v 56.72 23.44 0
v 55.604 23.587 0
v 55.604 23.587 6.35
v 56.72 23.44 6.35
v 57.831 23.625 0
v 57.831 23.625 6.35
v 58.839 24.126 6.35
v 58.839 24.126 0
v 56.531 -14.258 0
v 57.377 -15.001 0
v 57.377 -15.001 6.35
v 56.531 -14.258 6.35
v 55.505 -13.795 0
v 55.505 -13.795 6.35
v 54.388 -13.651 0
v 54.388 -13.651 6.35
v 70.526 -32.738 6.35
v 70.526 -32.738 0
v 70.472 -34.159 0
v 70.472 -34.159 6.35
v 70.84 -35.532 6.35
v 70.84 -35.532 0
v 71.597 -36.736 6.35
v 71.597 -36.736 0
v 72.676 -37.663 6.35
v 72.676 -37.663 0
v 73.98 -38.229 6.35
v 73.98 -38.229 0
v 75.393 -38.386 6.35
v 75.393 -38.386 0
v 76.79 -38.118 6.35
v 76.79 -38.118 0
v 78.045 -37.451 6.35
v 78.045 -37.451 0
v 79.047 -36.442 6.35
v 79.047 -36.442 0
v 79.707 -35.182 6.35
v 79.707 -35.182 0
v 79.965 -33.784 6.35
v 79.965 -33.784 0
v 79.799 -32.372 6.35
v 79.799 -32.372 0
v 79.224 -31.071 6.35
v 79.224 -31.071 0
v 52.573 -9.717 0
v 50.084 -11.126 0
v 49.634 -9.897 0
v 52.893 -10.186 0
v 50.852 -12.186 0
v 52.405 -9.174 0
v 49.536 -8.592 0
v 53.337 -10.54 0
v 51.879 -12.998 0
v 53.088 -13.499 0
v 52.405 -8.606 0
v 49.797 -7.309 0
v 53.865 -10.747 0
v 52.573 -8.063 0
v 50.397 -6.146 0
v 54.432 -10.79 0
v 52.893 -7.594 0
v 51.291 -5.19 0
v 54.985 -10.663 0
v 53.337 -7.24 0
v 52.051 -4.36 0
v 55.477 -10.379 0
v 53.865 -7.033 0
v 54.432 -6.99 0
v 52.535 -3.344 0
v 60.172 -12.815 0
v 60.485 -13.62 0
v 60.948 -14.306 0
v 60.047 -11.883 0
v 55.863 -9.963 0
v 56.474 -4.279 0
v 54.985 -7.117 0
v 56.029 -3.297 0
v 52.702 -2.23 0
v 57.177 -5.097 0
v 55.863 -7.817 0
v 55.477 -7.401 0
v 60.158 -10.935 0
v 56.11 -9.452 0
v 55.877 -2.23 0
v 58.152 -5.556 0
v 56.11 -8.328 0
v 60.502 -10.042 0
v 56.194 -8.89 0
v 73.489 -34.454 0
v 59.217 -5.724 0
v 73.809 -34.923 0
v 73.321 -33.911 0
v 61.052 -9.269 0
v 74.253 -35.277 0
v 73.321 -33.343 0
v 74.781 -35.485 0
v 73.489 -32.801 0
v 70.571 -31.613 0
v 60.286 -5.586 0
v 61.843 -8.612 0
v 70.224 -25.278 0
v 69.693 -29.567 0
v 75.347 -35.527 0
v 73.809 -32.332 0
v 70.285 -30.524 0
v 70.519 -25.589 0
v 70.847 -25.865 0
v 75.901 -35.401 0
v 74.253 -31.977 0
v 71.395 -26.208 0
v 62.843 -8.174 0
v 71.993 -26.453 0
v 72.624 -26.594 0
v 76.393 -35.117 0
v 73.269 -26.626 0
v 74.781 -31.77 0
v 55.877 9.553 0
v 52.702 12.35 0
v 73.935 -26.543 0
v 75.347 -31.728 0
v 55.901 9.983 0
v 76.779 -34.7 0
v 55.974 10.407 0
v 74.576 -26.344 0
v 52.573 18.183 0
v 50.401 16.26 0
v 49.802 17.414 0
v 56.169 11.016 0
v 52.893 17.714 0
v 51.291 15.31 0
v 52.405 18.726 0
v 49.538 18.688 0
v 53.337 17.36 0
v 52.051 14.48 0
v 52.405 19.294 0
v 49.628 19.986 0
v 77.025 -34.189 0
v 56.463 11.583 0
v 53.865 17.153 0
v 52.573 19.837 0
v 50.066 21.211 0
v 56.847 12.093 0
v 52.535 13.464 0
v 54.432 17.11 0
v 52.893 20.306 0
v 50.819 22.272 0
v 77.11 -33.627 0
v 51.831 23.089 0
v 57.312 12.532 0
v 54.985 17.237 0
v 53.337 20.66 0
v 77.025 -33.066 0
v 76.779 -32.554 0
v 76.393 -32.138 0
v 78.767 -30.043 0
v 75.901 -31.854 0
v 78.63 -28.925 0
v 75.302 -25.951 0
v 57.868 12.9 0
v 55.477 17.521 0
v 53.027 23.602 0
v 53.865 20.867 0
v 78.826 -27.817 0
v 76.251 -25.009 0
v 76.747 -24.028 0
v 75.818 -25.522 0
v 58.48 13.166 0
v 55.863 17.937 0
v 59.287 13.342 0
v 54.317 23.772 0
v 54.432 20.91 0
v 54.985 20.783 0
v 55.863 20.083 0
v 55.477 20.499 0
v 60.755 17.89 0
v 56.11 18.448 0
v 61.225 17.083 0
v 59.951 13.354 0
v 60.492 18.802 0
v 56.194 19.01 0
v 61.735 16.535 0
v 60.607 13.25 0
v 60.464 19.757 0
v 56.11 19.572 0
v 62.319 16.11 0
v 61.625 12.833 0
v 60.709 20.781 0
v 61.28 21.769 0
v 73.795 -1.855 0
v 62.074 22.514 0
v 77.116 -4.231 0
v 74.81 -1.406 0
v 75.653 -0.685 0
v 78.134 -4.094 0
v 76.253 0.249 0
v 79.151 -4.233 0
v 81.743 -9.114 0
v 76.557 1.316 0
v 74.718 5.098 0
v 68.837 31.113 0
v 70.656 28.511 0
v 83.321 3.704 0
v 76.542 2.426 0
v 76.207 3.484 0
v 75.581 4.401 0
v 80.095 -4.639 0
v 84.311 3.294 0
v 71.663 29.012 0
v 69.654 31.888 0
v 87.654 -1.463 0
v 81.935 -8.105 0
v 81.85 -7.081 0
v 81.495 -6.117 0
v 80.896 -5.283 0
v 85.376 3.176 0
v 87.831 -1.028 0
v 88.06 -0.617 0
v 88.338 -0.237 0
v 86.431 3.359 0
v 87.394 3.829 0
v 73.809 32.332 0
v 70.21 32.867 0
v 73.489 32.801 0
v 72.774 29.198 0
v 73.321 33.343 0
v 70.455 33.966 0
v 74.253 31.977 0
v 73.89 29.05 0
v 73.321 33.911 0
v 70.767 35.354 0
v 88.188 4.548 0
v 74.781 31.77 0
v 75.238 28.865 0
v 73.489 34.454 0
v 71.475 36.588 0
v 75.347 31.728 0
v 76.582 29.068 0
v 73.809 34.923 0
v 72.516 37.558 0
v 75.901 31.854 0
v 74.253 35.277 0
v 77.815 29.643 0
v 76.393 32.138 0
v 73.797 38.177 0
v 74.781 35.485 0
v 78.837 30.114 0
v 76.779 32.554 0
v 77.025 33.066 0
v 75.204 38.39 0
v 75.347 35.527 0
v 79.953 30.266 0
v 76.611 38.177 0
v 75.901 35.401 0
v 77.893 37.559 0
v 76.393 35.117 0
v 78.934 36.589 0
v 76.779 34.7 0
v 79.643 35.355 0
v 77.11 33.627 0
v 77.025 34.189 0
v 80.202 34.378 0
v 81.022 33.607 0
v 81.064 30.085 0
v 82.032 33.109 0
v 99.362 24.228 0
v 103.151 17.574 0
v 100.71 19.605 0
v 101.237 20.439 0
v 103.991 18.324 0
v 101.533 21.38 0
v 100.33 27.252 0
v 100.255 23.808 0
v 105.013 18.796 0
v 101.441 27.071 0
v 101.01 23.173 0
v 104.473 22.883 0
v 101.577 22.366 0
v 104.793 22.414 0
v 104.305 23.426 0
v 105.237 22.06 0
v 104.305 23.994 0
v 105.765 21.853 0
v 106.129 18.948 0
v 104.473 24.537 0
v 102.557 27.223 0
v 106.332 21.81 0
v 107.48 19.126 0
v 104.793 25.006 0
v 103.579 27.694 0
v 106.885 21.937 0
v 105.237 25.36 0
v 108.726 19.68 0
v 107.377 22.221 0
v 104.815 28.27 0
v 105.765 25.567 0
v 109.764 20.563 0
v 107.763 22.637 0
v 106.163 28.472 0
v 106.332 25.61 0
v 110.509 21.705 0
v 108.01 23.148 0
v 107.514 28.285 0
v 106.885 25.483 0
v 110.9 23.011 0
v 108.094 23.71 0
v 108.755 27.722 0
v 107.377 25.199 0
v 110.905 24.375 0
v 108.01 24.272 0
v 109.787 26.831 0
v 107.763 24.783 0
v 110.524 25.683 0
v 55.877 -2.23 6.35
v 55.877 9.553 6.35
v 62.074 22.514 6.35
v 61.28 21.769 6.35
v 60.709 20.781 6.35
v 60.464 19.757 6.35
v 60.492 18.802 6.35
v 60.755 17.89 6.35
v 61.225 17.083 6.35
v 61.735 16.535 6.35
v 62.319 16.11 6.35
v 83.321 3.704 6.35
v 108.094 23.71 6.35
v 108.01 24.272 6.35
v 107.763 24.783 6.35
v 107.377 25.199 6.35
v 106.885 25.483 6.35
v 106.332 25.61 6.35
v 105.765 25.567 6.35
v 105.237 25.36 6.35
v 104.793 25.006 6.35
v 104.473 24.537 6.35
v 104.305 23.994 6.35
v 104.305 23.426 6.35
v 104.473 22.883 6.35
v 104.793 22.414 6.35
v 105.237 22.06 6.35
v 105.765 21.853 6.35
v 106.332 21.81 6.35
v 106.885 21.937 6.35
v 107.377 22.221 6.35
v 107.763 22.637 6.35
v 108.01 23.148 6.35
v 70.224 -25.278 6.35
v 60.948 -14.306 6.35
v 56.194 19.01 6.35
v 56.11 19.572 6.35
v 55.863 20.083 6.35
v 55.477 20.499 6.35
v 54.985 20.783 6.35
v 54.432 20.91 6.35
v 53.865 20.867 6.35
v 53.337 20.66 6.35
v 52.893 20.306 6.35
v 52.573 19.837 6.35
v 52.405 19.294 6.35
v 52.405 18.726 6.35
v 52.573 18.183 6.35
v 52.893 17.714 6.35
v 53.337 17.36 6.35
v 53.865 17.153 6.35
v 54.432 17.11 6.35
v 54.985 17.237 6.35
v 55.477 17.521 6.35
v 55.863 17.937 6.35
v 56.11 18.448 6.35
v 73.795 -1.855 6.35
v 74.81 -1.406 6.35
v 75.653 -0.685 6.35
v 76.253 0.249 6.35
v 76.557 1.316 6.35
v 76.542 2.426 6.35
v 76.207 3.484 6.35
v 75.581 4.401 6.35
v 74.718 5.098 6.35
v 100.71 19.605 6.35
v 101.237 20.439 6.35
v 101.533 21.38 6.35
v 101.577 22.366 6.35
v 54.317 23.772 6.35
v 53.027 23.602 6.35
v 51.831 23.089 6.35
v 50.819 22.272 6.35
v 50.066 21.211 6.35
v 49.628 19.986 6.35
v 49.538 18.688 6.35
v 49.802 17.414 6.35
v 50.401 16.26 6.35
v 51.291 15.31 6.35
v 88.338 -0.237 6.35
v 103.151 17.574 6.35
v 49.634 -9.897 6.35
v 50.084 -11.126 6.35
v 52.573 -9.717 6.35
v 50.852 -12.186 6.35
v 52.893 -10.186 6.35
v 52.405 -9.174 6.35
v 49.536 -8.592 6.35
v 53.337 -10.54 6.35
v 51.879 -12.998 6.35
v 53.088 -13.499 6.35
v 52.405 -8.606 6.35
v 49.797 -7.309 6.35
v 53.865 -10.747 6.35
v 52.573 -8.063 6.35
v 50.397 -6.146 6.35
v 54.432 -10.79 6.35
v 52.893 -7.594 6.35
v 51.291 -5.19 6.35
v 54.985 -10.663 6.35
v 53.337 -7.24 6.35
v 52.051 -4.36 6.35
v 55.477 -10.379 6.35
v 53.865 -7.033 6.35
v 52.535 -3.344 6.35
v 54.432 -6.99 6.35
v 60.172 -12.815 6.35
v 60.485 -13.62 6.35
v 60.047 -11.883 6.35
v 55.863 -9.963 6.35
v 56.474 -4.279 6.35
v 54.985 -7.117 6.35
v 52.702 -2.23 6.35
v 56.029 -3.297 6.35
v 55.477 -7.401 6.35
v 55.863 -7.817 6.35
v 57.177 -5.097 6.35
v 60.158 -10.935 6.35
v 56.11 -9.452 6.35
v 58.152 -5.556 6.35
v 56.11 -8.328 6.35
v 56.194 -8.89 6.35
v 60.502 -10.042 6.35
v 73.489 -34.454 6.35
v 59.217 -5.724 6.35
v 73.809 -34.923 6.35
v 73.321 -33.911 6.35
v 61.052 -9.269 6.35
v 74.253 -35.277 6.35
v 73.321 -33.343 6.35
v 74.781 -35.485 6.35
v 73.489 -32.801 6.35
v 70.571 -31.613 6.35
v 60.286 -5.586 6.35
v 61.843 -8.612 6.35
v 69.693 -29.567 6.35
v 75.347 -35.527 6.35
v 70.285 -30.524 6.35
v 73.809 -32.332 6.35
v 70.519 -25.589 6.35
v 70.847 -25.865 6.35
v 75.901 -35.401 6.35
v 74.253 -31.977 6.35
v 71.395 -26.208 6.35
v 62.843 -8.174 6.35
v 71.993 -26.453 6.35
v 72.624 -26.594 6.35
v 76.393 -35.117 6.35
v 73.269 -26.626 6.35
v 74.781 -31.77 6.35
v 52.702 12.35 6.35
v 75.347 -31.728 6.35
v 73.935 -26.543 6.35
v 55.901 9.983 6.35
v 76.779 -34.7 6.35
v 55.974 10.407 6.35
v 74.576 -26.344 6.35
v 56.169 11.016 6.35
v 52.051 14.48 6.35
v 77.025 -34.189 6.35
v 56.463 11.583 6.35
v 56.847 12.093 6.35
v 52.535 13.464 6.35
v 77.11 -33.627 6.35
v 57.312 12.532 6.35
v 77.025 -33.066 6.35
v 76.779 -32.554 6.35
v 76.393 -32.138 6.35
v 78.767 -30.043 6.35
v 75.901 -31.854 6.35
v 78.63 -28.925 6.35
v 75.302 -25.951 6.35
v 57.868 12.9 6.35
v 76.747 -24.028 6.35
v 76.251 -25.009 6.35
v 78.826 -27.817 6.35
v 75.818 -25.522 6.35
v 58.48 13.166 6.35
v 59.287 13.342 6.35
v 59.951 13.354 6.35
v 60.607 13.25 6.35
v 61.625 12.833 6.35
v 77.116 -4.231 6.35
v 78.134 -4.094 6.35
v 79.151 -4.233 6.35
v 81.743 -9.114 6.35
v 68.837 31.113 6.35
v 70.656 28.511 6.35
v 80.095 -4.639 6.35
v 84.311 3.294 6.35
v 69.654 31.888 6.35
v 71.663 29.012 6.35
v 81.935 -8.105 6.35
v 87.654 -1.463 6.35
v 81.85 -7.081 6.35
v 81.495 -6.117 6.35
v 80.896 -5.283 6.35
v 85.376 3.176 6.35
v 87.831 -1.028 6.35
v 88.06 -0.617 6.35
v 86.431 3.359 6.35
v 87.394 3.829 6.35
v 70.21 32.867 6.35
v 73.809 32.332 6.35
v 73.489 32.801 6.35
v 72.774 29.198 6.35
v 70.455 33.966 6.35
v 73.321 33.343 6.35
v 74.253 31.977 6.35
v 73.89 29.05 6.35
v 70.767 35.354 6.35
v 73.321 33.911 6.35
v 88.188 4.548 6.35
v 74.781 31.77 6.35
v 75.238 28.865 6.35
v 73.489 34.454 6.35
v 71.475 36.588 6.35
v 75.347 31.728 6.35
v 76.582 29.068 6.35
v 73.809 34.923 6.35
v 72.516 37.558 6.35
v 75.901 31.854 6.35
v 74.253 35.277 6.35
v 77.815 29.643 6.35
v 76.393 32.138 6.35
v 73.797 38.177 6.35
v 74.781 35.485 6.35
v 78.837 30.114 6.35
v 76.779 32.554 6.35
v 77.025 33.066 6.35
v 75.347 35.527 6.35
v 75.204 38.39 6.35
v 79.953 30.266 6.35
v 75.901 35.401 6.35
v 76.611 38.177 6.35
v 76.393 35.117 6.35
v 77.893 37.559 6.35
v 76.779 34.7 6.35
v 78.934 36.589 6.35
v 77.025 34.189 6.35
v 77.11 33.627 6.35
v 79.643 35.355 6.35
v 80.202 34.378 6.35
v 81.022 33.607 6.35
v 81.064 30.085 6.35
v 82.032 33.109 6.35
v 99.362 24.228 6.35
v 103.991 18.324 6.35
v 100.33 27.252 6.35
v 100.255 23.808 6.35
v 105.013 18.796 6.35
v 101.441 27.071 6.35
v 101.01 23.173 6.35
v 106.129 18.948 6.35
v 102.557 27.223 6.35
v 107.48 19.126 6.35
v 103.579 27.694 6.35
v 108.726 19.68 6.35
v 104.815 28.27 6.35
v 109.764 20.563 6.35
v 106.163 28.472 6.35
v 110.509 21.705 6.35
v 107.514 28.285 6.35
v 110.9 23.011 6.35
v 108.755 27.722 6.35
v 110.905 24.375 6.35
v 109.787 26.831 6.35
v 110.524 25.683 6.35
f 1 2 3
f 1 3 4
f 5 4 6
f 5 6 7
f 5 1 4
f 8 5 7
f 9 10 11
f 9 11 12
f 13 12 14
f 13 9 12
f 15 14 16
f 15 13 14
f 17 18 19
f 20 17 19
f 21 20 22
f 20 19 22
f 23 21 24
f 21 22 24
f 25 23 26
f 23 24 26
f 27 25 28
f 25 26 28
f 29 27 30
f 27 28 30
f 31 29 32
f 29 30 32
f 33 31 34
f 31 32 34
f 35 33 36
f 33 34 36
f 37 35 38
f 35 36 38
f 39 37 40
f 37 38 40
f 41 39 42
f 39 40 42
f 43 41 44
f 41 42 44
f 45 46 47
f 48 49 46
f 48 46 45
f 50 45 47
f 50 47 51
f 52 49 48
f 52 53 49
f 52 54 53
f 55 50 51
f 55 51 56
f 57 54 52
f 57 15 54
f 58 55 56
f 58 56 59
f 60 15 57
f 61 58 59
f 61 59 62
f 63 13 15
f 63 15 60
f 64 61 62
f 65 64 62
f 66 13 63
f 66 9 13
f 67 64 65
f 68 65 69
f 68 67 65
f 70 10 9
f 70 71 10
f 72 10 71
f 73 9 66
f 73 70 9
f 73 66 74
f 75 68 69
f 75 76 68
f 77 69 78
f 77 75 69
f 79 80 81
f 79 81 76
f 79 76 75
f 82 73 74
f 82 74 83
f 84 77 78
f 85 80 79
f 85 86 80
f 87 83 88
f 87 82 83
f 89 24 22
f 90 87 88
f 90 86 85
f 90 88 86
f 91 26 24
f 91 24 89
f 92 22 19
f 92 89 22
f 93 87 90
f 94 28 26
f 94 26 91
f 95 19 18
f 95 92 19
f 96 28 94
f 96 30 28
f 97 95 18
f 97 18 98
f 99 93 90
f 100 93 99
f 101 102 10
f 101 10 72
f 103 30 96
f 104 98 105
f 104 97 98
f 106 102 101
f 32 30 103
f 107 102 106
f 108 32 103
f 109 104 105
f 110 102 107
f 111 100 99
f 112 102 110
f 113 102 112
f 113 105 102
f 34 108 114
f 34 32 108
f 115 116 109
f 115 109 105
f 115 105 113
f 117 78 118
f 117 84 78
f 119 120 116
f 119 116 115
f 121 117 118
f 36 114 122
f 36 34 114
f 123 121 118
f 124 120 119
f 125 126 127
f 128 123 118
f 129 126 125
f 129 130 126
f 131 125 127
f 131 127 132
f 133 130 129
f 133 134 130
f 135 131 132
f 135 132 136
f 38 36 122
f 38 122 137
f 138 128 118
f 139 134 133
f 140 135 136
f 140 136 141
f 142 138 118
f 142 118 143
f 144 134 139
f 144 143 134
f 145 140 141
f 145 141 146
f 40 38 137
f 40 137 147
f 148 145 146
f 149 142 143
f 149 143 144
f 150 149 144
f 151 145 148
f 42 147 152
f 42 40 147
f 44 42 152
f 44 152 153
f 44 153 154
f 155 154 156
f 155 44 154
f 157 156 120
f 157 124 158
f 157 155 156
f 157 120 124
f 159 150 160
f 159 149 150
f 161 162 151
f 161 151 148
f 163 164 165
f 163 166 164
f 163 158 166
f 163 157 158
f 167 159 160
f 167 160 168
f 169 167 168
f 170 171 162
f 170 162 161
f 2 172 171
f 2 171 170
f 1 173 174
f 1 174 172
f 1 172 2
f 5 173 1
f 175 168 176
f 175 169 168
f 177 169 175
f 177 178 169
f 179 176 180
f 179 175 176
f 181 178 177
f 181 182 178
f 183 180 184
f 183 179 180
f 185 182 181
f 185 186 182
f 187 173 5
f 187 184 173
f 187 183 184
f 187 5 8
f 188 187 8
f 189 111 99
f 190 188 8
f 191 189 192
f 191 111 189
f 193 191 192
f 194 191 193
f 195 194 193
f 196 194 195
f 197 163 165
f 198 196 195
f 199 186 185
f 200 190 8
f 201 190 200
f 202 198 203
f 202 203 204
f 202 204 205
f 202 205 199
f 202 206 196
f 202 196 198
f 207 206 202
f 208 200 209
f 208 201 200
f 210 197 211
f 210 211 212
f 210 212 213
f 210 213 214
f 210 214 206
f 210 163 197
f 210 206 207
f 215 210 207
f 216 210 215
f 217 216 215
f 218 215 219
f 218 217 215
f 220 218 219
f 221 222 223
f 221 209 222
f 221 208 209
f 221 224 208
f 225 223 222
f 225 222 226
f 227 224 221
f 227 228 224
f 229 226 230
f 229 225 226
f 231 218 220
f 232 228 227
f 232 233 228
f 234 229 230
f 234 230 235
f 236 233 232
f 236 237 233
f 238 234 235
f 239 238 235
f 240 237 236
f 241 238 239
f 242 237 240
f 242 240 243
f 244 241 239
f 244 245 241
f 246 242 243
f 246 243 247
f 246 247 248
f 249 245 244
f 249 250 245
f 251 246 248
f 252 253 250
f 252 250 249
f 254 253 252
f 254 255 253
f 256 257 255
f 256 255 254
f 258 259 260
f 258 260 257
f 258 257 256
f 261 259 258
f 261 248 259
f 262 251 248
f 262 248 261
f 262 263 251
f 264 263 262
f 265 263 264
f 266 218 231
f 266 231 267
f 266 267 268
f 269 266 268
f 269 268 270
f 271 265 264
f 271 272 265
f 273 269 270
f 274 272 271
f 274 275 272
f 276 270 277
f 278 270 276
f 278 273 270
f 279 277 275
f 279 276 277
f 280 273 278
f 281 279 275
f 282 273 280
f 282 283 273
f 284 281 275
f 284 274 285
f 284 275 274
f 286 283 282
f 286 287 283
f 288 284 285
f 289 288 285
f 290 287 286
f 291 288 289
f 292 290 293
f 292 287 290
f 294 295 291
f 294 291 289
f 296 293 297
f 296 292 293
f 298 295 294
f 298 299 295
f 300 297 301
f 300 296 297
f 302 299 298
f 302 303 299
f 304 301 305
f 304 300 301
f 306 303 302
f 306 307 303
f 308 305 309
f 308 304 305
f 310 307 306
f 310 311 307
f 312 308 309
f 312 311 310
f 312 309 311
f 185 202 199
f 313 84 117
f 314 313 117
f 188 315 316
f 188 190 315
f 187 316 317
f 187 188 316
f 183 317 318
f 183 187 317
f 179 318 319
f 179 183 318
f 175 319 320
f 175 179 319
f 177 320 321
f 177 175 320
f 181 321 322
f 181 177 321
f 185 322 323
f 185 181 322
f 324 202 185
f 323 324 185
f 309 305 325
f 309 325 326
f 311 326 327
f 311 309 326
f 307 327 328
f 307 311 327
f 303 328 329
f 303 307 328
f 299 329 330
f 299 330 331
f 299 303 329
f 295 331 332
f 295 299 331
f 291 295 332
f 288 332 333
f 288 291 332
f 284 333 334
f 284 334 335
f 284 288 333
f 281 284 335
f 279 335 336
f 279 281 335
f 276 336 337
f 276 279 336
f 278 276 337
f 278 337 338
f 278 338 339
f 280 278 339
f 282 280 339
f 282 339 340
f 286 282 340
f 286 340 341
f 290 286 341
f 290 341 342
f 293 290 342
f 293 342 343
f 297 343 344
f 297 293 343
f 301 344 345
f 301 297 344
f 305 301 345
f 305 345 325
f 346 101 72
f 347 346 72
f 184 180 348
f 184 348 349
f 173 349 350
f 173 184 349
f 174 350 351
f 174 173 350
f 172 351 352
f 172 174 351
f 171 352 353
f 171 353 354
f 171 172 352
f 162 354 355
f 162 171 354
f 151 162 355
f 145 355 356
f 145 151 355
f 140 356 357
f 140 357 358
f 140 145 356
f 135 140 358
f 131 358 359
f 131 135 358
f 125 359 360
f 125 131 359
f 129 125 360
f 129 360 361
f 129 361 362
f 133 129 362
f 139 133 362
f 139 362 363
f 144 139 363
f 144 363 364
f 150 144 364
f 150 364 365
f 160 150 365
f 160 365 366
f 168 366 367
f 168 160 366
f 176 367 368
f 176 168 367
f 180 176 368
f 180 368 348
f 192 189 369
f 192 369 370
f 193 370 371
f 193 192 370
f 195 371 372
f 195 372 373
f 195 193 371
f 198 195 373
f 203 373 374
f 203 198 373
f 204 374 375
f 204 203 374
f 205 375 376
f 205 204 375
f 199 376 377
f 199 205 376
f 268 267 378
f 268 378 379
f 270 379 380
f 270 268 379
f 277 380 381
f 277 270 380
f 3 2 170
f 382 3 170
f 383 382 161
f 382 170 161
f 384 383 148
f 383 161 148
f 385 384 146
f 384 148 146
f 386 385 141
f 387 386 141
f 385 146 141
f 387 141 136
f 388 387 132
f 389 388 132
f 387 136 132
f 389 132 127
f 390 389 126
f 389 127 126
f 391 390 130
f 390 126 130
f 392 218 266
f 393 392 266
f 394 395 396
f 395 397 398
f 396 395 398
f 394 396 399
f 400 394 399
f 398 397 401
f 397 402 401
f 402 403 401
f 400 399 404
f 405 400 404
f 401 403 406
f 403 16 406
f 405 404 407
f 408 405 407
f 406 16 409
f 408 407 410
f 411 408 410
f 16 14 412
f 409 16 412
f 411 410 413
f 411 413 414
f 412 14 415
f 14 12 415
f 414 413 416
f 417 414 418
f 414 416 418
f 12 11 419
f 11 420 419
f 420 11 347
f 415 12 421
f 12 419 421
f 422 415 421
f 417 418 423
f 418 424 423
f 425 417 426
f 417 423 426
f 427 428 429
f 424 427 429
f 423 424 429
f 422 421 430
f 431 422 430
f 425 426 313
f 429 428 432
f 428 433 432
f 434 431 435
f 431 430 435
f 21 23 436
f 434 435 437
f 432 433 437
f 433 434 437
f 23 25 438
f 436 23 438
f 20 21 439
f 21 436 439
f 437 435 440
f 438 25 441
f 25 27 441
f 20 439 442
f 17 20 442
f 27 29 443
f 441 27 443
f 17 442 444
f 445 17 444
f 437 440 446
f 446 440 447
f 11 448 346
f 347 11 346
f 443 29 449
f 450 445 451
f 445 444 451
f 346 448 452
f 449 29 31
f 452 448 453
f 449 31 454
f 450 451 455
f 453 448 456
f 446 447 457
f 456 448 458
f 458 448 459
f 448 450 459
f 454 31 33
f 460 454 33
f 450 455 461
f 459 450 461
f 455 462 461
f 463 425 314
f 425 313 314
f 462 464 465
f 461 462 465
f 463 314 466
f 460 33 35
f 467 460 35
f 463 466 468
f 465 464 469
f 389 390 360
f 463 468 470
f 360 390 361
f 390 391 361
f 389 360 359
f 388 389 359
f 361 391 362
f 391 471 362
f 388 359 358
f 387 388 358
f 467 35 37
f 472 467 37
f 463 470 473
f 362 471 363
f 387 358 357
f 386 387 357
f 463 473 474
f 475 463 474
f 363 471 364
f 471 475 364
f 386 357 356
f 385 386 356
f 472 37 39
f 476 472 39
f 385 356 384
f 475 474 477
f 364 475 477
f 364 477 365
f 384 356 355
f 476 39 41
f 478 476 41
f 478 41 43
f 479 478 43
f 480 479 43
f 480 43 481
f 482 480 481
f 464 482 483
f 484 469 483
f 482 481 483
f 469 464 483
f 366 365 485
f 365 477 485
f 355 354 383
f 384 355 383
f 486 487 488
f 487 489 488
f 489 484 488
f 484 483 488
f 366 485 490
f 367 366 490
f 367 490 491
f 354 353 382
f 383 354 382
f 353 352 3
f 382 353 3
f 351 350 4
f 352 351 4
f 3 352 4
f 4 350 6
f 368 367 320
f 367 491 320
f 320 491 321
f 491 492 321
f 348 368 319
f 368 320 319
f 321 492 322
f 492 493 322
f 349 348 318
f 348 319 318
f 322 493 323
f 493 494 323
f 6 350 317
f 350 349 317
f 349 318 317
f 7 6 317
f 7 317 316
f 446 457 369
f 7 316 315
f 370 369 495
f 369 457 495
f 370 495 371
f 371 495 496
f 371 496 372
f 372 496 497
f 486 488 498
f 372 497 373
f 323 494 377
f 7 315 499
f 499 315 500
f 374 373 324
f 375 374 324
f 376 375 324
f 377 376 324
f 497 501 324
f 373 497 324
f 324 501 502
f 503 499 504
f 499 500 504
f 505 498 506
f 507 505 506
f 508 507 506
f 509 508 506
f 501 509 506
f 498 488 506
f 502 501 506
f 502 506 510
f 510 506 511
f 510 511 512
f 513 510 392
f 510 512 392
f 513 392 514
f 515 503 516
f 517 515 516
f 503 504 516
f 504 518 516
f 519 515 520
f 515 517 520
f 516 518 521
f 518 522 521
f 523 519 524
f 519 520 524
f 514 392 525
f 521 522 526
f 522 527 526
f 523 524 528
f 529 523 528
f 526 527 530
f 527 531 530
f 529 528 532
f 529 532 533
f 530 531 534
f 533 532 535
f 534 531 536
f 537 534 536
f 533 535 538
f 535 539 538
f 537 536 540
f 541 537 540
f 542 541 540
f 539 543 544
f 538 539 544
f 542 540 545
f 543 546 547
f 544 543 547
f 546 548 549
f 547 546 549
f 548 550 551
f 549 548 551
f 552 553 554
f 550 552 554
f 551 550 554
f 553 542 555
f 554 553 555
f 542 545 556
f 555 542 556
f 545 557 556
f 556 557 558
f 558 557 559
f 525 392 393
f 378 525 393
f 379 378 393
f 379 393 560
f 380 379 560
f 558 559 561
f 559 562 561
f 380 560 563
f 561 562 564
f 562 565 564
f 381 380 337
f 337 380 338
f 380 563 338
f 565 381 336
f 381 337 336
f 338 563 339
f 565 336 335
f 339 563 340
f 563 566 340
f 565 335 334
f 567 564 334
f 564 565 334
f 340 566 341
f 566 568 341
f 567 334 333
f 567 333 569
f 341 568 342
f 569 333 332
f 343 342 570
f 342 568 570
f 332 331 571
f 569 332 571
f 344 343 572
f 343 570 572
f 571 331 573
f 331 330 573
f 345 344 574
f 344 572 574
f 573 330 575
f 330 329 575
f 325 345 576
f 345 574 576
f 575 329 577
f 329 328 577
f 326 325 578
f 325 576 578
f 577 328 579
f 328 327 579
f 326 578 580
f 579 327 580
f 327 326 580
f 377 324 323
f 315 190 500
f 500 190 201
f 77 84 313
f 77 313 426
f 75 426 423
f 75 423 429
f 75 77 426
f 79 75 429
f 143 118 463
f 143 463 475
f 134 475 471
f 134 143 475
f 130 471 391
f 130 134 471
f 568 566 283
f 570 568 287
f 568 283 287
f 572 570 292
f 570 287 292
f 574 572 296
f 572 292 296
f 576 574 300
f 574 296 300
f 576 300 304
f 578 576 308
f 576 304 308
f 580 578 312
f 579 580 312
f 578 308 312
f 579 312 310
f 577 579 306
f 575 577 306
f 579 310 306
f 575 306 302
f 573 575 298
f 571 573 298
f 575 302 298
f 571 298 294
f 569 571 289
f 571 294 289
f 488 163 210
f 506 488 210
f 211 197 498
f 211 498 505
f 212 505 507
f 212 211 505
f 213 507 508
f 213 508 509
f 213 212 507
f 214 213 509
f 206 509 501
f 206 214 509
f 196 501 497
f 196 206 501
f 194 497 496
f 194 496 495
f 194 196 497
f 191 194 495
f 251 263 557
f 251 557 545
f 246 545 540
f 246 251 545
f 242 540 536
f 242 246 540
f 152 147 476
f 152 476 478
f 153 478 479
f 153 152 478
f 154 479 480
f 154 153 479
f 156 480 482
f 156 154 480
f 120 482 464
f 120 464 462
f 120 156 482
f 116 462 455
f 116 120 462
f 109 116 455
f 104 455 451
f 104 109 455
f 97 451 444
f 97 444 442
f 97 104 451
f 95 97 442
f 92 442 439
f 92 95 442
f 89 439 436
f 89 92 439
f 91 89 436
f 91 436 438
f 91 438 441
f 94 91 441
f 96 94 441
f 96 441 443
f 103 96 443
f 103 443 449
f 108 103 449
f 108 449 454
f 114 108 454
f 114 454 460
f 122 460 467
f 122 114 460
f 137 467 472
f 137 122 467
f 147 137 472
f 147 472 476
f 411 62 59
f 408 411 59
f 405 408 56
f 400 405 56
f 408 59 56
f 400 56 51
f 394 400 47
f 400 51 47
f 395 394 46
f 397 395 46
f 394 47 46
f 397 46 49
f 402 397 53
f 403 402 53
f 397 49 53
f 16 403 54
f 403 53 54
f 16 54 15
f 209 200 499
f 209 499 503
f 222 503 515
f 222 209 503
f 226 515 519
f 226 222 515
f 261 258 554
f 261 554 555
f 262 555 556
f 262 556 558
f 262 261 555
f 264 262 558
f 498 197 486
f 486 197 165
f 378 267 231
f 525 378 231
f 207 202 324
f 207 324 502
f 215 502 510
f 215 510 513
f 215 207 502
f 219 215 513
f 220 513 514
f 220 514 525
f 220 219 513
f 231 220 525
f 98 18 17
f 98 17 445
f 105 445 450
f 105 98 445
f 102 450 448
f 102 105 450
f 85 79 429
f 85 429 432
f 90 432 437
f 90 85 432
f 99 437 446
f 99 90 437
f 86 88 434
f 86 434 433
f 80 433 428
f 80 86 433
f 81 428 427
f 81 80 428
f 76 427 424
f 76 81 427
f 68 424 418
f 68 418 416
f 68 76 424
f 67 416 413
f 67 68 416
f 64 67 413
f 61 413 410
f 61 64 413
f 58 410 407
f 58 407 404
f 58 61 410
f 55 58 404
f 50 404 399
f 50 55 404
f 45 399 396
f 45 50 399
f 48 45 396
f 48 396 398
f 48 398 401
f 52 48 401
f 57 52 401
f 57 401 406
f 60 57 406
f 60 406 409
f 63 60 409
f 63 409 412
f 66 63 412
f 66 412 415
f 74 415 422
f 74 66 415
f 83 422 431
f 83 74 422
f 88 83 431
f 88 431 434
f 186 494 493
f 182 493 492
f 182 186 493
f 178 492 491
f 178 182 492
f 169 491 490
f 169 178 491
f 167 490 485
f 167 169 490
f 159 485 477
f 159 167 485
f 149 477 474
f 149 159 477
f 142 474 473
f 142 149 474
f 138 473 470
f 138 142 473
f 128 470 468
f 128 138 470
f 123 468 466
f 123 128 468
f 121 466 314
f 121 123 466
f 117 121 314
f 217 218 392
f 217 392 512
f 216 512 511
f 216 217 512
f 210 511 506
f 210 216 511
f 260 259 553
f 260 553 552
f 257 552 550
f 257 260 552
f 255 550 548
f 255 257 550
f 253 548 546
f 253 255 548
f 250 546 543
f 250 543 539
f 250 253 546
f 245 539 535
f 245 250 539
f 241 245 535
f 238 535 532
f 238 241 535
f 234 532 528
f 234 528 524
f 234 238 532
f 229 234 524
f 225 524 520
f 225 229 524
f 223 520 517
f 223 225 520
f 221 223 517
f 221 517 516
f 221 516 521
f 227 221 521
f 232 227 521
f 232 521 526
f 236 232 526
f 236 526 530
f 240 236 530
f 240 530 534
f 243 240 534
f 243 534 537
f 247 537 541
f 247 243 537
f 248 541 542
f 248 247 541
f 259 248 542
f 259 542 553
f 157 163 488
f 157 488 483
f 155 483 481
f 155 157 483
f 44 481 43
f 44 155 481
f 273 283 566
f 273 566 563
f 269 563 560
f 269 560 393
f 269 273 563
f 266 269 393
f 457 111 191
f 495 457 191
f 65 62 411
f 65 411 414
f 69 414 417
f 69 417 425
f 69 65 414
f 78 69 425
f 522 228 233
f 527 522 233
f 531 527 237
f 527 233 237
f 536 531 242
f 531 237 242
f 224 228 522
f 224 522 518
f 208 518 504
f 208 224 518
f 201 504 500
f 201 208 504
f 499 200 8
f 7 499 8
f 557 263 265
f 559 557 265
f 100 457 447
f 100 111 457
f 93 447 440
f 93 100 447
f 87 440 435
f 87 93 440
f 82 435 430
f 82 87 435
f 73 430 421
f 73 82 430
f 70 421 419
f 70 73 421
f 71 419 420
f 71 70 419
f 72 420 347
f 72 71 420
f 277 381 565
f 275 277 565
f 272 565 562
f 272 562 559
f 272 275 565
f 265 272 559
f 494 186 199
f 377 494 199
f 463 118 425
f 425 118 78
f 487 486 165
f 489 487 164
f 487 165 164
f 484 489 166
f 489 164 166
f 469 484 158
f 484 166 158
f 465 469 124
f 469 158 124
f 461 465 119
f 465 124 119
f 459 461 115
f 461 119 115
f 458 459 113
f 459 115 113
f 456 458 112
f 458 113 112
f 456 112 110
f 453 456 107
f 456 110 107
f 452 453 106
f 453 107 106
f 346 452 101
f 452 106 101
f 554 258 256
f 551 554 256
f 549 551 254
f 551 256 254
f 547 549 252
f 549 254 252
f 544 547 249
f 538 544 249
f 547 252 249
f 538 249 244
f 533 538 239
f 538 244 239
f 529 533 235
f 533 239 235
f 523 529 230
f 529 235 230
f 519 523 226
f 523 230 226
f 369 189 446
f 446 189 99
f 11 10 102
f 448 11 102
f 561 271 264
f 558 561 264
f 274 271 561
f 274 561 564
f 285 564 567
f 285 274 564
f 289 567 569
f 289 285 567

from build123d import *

# Parameters (mm, degrees)
SKETCH1_R           = 4.7625
SKETCH1_R_2         = 1.905
BOSS_EXTRUDE1_DEPTH = 6.35
FILLET1_R           = 3.81
FILLET2_R           = 3.81


with BuildPart() as part:
    # Sketch1 → Boss-Extrude1 (new body)
    # profile 1 of 10: a face of its own
    with BuildSketch(Plane.XY):
        with Locations((106.189208713, 23.71)):
            Circle(SKETCH1_R)
        with Locations((106.189208713, 23.71)):
            Circle(SKETCH1_R_2, mode=Mode.SUBTRACT)
    # profile 2 of 10: a face of its own
    with BuildSketch(Plane.XY):
        with BuildLine():
            Line((87.880964772, -0.786362752), (104.53862394, 19.242676846))
            ThreePointArc((104.53862394, 19.242676846), (103.143914747, 20.048362263), (102.097532116, 21.272872823))
            Line((102.097532116, 21.272872823), (86.113888675, 2.054264483))
            Line((86.113888675, 2.054264483), (58.96261429, 18.093110387))
            ThreePointArc((58.96261429, 18.093110387), (58.389707875, 16.587746324), (57.347778506, 15.359444279))
            Line((57.347778506, 15.359444279), (82.443811077, 0.534674233))
            Line((82.443811077, 0.534674233), (58.194514032, -6.164197988))
            ThreePointArc((58.194514032, -6.164197988), (58.832358657, -7.4612961), (59.051708713, -8.89))
            ThreePointArc((59.051708713, -8.89), (59.048766191, -9.057388361), (59.039942261, -9.224569879))
            Line((59.039942261, -9.224569879), (84.017242402, -2.324586685))
            Line((84.017242402, -2.324586685), (75.126101157, -28.865420044))
            ThreePointArc((75.126101157, -28.865420044), (76.717900747, -29.111421646), (78.136663259, -29.873954045))
            Line((78.136663259, -29.873954045), (87.880964772, -0.786362752))
        make_face()
    # profile 3 of 10: a face of its own
    with BuildSketch(Plane.XY):
        with BuildLine():
            ThreePointArc((101.428860996, 23.566836206), (101.65338858, 25.161806453), (102.396731965, 26.590716294))
            Line((102.396731965, 26.590716294), (79.965447461, 33.770428593))
            ThreePointArc((79.965447461, 33.770428593), (79.967061643, 33.698854784), (79.967599745, 33.627264799))
            ThreePointArc((79.967599745, 33.627264799), (79.718583807, 32.107439852), (78.997576492, 30.746548504))
            Line((78.997576492, 30.746548504), (101.428860996, 23.566836206))
        make_face()
    # profile 4 of 10: a face of its own
    with BuildSketch(Plane.XY):
        with Locations((75.205099745, 33.627264799)):
            Circle(SKETCH1_R)
        with Locations((75.205099745, 33.627264799)):
            Circle(SKETCH1_R_2, mode=Mode.SUBTRACT)
    # profile 5 of 10: a face of its own
    with BuildSketch(Plane.XY):
        with BuildLine():
            ThreePointArc((72.434047253, 29.753936212), (71.301416872, 30.89913975), (70.615297221, 32.356391461))
            Line((70.615297221, 32.356391461), (57.060261204, 22.883328587))
            ThreePointArc((57.060261204, 22.883328587), (58.192891585, 21.738125049), (58.879011236, 20.280873338))
            Line((58.879011236, 20.280873338), (72.434047253, 29.753936212))
        make_face()
    # profile 6 of 10: a face of its own
    with BuildSketch(Plane.XY):
        with Locations((54.289208713, 19.01)):
            Circle(SKETCH1_R)
        with Locations((54.289208713, 19.01)):
            Circle(SKETCH1_R_2, mode=Mode.SUBTRACT)
    # profile 7 of 10: a face of its own
    with BuildSketch(Plane.XY):
        with BuildLine():
            ThreePointArc((55.876708713, 14.519871939), (54.289208713, 14.2475), (52.701708713, 14.519871939))
            Line((52.701708713, 14.519871939), (52.701708713, -4.399871939))
            ThreePointArc((52.701708713, -4.399871939), (54.289208713, -4.1275), (55.876708713, -4.399871939))
            Line((55.876708713, -4.399871939), (55.876708713, 14.519871939))
        make_face()
    # profile 8 of 10: a face of its own
    with BuildSketch(Plane.XY):
        with Locations((54.289208713, -8.89)):
            Circle(SKETCH1_R)
        with Locations((54.289208713, -8.89)):
            Circle(SKETCH1_R_2, mode=Mode.SUBTRACT)
    # profile 9 of 10: a face of its own
    with BuildSketch(Plane.XY):
        with BuildLine():
            ThreePointArc((58.400562122, -11.29378439), (57.364168417, -12.526760793), (55.976054927, -13.343757526))
            Line((55.976054927, -13.343757526), (71.093746335, -31.223480409))
            ThreePointArc((71.093746335, -31.223480409), (72.13014004, -29.990504006), (73.518253531, -29.173507273))
            Line((73.518253531, -29.173507273), (58.400562122, -11.29378439))
        make_face()
    # profile 10 of 10: a face of its own
    with BuildSketch(Plane.XY):
        with Locations((75.205099745, -33.627264799)):
            Circle(SKETCH1_R)
        with Locations((75.205099745, -33.627264799)):
            Circle(SKETCH1_R_2, mode=Mode.SUBTRACT)
    extrude(amount=BOSS_EXTRUDE1_DEPTH)

    # Fillet1
    # the kernel refuses this fillet: 3.81 mm, written as the material it adds along each edge
    with BuildSketch(Plane(origin=(58.96261429, 18.093110387, 0), x_dir=(0.8609971993913142, -0.5086096957789081, 0), z_dir=(0, 0, 1)), Plane(origin=(75.126101157, -28.865420044, 0), x_dir=(0.31764850444110154, 0.9482085359383406, 0), z_dir=(0, 0, 1)), Plane(origin=(79.965447461, 33.770428593, 0), x_dir=(0.9524031774112249, -0.30484124992691375, 0), z_dir=(0, 0, 1)), Plane(origin=(104.53862394, 19.242676846, 0), x_dir=(-0.6394318036990395, -0.7688478187640211, 0), z_dir=(0, 0, 1)), Plane(origin=(52.701708713, -4.399871939, 0), x_dir=(0, 1, 0), z_dir=(0, 0, 1)), Plane(origin=(57.060261204, 22.883328587, 0), x_dir=(0.8196709443644911, 0.572834655869059, 0), z_dir=(0, 0, 1))) as fillet1_piece_1:
        with BuildLine():
            CenterArc((2.169808125, 3.81), FILLET1_R, 219.022802565, 50.977197435)
            ThreePointArc((-0.790163513, 1.411111111), (-0.334744459, 0.739341932), (0, 0))
            Line((0, 0), (2.169808125, 0))
        make_face()
    extrude(amount=6.35)
    with BuildSketch(Plane(origin=(86.113888675, 2.054264483, 0), x_dir=(-0.8609971993913146, 0.5086096957789075, 0), z_dir=(0, 0, 1))) as fillet1_piece_2:
        with BuildLine():
            CenterArc((FILLET1_R * 0.85139484235, -FILLET1_R), FILLET1_R, 90, 80.821803005)
            Line((-FILLET1_R * 0.135802191515, -FILLET1_R * 0.840494463015), (0, 0))
            Line((0, 0), (FILLET1_R * 0.85139484235, 0))
        make_face()
    extrude(amount=6.35)
    with BuildSketch(Plane(origin=(102.097532116, 21.272872823, 0), x_dir=(-0.6394318036990395, -0.7688478187640211, 0), z_dir=(0, 0, 1)), Plane(origin=(78.997576492, 30.746548504, 0), x_dir=(0.9524031774112243, -0.3048412499269152, 0), z_dir=(0, 0, 1)), Plane(origin=(58.879011236, 20.280873338, 0), x_dir=(0.819670944364491, 0.5728346558690592, 0), z_dir=(0, 0, 1)), Plane(origin=(73.518253531, -29.173507273, 0), x_dir=(-0.6456608303485428, 0.7636243134903644, 0), z_dir=(0, 0, 1)), Plane(origin=(59.039942261, -9.224569879, 0), x_dir=(0.9638966585389959, 0.2662766074167205, 0), z_dir=(0, 0, 1)), Plane(origin=(57.347778506, 15.359444279, 0), x_dir=(0.8609971993913154, -0.5086096957789064, 0), z_dir=(0, 0, 1))) as fillet1_piece_3:
        with BuildLine():
            CenterArc((2.169808125, -3.81), FILLET1_R, 90, 50.977197435)
            ThreePointArc((-0.790163513, -1.411111111), (-0.334744459, -0.739341932), (0, 0))
            Line((0, 0), (2.169808125, 0))
        make_face()
    extrude(amount=6.35)
    with BuildSketch(Plane(origin=(101.428860996, 23.566836206, 0), x_dir=(0.19934053923435113, -0.9799302778349887, 0), z_dir=(0, 0, 1)), Plane(origin=(72.434047253, 29.753936212, 0), x_dir=(0.9002818811258162, -0.4353074023222692, 0), z_dir=(0, 0, 1)), Plane(origin=(58.400562122, -11.29378439, 0), x_dir=(0.3508244107521176, 0.9364412596743211, 0), z_dir=(0, 0, 1)), Plane(origin=(58.194514032, -6.164197988, 0), x_dir=(-0.7032685796981372, 0.7109242609514496, 0), z_dir=(0, 0, 1)), Plane(origin=(55.876708713, 14.519871939, 0), x_dir=(0.8725214911102023, 0.48857573369010987, 0), z_dir=(0, 0, 1)), Plane(origin=(71.093746335, -31.223480409, 0), x_dir=(-0.3508244107521106, -0.9364412596743238, 0), z_dir=(0, 0, 1))) as fillet1_piece_4:
        with BuildLine():
            CenterArc((2.264191284, -3.754677766), FILLET1_R, 99.775790965, 50.977197435)
            Line((-1.060115597, -1.893204221), (0, 0))
            ThreePointArc((0, 0), (0.808639744, -0.069152792), (1.617279489, 0))
        make_face()
    extrude(amount=6.35)
    with BuildSketch(Plane(origin=(84.017242402, -2.324586685, 0), x_dir=(-0.3176485044411025, -0.9482085359383404, 0), z_dir=(0, 0, 1))) as fillet1_piece_5:
        with BuildLine():
            CenterArc((FILLET1_R * 1.8792860539, -FILLET1_R), FILLET1_R, 90, 123.963598679)
            Line((FILLET1_R * 1.04989338062, -FILLET1_R * 1.55866608409), (0, 0))
            Line((0, 0), (FILLET1_R * 1.8792860539, 0))
        make_face()
    extrude(amount=6.35)
    with BuildSketch(Plane(origin=(55.876708713, -4.399871939, 0), x_dir=(0.8725214911102017, -0.488575733690111, 0), z_dir=(0, 0, 1)), Plane(origin=(70.615297221, 32.356391461, 0), x_dir=(-0.09933921507111794, 0.9950536268709613, 0), z_dir=(0, 0, 1)), Plane(origin=(102.396731965, 26.590716294, 0), x_dir=(0.7313016231106118, 0.682054203150882, 0), z_dir=(0, 0, 1)), Plane(origin=(78.136663259, -29.873954045, 0), x_dir=(0.6721369745474647, -0.740426827881176, 0), z_dir=(0, 0, 1)), Plane(origin=(55.976054927, -13.343757526, 0), x_dir=(-0.9817328385571232, -0.1902646412199953, 0), z_dir=(0, 0, 1)), Plane(origin=(52.701708713, 14.519871939, 0), x_dir=(-0.8725214911102018, 0.48857573369011076, 0), z_dir=(0, 0, 1))) as fillet1_piece_6:
        with BuildLine():
            CenterArc((2.264191284, 3.754677766), FILLET1_R, 209.2470116, 50.977197435)
            Line((-1.060115597, 1.893204221), (0, 0))
            ThreePointArc((0, 0), (0.808639744, 0.069152792), (1.617279489, 0))
        make_face()
    extrude(amount=6.35)
    with BuildSketch(Plane(origin=(82.443811077, 0.534674233, 0), x_dir=(-0.9638966585389961, -0.2662766074167203, 0), z_dir=(0, 0, 1))) as fillet1_piece_7:
        with BuildLine():
            CenterArc((FILLET1_R * 2.35504725068, -FILLET1_R), FILLET1_R, 90, 133.985910602)
            Line((FILLET1_R * 1.63553665117, -FILLET1_R * 1.69448145921), (0, 0))
            Line((0, 0), (FILLET1_R * 2.35504725068, 0))
        make_face()
    extrude(amount=6.35)
    with BuildSketch(Plane(origin=(87.880964772, -0.786362752, 0), x_dir=(-0.3176485044411054, -0.9482085359383393, 0), z_dir=(0, 0, 1))) as fillet1_piece_8:
        with BuildLine():
            CenterArc((FILLET1_R * 0.187404040861, FILLET1_R), FILLET1_R, 248.771312287, 21.228687713)
            Line((-FILLET1_R * 0.174687293783, FILLET1_R * 0.0678573792733), (0, 0))
            Line((0, 0), (FILLET1_R * 0.187404040861, 0))
        make_face()
    extrude(amount=6.35)

    # Fillet2
    fillet2_edges = [part.edges().sort_by_distance(p)[0] for p in [
        (74.278682032, -28.792470042, 3.175),
        (59.113584062, 19.194358415, 3.175),
        (58.904928759, -10.316241556, 3.175),
        (56.72342156, 14.744855925, 3.175),
    ]]
    fillet(fillet2_edges, radius=FILLET2_R)


solid = part.part
